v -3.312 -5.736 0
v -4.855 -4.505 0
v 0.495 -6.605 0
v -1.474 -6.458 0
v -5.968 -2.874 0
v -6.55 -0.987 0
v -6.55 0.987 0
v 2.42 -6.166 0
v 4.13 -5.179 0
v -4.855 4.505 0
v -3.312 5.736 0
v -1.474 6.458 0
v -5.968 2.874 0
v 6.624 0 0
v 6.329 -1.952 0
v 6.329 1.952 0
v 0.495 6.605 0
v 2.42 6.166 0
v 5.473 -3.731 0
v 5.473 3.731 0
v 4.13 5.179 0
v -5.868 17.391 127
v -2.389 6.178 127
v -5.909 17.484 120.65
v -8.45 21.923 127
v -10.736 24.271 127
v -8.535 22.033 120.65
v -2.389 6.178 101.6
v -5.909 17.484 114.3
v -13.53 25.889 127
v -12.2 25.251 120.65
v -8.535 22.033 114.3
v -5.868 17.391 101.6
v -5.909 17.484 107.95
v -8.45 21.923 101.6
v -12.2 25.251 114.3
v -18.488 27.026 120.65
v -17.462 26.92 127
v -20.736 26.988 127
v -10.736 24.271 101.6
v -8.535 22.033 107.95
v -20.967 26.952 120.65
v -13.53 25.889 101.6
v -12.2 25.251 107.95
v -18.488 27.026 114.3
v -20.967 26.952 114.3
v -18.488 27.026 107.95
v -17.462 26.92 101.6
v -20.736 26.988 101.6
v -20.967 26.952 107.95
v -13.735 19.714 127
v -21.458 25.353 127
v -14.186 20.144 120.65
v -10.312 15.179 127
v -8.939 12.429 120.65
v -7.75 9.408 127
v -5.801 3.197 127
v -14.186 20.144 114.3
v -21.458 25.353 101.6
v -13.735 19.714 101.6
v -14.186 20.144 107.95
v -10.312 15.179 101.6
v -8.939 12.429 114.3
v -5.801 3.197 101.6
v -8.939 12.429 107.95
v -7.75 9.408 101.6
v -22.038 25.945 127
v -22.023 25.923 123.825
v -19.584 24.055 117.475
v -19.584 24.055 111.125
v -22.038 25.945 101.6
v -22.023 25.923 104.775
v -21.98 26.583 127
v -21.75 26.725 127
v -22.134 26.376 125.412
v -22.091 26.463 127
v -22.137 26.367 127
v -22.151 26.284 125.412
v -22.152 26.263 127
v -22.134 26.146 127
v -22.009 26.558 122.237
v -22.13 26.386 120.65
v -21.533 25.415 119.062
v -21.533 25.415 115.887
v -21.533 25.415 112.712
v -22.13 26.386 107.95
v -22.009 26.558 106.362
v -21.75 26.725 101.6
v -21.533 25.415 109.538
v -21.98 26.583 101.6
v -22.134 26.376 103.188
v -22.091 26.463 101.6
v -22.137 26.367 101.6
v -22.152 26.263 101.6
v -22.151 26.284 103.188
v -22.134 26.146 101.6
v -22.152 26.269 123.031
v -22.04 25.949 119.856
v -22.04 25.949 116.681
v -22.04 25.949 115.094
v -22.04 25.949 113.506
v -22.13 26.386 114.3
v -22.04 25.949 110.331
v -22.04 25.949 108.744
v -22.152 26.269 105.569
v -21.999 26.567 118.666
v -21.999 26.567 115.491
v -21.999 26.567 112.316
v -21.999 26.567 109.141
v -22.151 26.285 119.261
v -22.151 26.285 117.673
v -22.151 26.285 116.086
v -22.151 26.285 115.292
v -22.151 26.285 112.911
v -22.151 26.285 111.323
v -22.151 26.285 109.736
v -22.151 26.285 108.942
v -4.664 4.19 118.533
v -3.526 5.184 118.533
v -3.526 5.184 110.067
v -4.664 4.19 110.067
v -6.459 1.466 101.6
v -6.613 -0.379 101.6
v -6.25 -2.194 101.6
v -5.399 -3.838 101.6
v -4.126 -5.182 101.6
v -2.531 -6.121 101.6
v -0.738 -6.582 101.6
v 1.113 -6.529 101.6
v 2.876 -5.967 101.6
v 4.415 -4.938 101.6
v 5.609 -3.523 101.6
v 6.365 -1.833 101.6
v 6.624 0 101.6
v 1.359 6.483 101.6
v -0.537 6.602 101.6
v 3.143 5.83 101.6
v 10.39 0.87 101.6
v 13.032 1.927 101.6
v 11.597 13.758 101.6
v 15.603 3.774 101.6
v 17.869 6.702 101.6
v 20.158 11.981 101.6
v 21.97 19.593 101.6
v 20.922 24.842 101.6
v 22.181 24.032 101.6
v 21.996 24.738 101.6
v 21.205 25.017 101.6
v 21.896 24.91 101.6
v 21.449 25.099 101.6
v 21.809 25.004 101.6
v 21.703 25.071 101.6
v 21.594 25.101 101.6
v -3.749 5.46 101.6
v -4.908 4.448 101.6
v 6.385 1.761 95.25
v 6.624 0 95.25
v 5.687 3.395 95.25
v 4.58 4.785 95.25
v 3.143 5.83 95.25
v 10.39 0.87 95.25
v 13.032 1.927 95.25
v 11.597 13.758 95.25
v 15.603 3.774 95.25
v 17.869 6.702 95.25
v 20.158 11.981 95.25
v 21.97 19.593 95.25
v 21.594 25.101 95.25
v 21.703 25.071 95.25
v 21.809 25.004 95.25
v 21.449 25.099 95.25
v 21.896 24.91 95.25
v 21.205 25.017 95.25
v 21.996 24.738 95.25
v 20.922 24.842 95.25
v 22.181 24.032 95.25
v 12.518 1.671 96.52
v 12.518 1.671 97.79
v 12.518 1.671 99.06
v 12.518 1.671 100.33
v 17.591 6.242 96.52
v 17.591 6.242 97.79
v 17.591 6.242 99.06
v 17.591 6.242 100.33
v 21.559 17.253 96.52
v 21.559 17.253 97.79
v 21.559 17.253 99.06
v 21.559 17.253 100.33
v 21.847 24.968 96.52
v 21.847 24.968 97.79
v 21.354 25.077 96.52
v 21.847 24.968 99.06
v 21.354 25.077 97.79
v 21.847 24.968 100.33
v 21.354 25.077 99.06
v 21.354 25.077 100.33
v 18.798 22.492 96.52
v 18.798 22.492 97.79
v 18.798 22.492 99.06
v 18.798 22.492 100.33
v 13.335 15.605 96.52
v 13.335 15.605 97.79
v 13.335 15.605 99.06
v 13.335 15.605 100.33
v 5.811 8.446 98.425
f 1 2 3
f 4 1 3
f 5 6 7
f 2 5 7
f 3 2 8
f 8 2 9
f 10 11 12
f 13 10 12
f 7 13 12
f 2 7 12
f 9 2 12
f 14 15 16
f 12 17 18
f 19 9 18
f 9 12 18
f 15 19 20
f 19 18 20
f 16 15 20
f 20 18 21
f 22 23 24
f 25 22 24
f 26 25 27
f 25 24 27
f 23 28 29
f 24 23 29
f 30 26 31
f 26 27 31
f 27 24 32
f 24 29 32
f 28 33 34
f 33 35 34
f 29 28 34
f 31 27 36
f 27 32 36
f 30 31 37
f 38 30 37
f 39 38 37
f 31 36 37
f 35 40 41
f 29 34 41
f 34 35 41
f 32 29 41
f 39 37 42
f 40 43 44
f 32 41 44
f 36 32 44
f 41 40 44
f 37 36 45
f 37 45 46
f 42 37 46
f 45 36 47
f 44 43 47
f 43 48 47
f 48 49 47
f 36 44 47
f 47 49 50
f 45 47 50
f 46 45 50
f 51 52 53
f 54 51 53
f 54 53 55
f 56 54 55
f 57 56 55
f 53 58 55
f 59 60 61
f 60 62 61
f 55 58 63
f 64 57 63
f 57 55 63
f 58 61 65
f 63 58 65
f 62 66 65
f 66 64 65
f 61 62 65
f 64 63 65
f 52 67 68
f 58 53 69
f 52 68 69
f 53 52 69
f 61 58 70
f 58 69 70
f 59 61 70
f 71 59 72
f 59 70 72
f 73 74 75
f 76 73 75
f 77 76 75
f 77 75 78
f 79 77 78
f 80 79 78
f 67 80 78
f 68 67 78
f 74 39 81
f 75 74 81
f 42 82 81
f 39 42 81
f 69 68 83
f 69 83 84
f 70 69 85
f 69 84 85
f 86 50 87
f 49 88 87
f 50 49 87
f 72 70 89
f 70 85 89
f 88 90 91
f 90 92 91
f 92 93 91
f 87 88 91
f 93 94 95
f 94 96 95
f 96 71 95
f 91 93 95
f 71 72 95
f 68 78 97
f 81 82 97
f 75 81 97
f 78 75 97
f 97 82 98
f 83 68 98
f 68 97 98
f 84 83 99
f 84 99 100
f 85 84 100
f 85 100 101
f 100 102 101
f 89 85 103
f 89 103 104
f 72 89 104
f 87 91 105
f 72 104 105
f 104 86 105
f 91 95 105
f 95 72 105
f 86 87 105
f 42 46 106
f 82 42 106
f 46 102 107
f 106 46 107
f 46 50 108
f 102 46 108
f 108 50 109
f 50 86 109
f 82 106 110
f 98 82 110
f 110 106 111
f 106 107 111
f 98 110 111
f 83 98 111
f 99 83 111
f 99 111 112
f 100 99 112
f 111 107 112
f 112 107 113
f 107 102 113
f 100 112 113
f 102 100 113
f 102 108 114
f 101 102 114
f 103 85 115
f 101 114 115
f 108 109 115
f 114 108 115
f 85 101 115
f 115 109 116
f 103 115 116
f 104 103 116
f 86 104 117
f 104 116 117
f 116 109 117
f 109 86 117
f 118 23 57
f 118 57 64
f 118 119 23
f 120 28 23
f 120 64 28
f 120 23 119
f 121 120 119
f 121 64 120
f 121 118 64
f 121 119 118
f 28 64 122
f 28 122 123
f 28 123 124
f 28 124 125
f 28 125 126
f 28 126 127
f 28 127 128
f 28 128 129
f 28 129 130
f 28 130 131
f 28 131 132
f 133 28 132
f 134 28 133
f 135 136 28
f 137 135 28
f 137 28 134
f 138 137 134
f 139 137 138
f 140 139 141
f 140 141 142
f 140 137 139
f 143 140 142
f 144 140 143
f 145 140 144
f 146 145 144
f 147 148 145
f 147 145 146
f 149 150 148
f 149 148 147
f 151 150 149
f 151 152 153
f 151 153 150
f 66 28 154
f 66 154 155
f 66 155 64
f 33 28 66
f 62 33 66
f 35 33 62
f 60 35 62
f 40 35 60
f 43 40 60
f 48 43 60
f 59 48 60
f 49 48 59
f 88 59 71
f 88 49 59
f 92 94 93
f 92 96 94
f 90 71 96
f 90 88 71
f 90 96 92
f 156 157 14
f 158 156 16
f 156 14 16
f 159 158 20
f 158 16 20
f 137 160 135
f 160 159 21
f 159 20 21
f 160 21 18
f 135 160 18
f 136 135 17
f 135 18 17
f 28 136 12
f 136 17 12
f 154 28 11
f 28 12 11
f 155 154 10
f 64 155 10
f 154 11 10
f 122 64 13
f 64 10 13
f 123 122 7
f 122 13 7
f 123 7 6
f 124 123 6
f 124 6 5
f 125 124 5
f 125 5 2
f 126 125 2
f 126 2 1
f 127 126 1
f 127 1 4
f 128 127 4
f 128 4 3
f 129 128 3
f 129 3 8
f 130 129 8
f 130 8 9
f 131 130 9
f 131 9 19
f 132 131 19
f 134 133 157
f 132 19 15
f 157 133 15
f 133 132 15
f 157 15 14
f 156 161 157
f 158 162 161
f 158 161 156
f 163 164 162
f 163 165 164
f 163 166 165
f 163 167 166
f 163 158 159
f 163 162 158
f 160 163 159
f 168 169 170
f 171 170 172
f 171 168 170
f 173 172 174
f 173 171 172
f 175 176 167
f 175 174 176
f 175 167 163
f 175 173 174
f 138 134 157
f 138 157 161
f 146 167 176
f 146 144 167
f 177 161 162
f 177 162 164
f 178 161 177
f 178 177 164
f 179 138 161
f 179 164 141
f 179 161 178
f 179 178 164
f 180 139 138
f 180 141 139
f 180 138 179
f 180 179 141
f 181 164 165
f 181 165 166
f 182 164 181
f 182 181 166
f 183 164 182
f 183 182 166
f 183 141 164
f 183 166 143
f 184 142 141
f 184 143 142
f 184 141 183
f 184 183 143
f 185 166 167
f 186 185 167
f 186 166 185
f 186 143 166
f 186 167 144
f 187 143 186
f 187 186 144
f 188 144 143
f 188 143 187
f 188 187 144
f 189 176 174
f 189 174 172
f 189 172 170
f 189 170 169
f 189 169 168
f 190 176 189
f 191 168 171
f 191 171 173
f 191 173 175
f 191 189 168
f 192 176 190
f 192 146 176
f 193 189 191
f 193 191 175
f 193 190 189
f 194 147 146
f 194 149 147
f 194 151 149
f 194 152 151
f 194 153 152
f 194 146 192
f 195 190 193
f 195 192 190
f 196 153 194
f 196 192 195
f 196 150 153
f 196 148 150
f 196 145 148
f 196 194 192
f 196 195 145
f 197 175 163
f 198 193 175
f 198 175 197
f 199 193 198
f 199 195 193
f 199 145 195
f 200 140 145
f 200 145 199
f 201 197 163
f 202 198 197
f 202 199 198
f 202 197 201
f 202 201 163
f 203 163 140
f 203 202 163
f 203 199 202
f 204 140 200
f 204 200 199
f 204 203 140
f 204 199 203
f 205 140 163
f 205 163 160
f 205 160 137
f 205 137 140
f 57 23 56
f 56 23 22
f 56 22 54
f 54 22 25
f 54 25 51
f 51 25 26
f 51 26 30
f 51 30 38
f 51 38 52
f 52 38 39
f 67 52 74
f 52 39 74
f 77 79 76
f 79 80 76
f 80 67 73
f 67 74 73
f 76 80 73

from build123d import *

# Parameters (mm, degrees)
F0_R     = 6.6235911541
F1_DEPTH = 101.6
F3_DEPTH = 6.35
F5_DEPTH = 25.4


with BuildPart() as f1:
    # F0 (on Top) → F1 (new body)
    with BuildSketch(Plane.XY):
        Circle(F0_R)
    extrude(amount=F1_DEPTH)

    # F2 (on face) → F3 (join)
    with BuildSketch(Plane.XY.offset(101.6)):
        with BuildLine():
            add(Edge.make_bspline(
                [(6.6235911541, 0), (5.551680706, 1.8932174639), (4.479770258, 3.7864349279), (3.4078598099, 5.6796523918)],
                knots=[0, 0, 0, 0, 6.5268200044, 6.5268200044, 6.5268200044, 6.5268200044], degree=3))
            add(Edge.make_bspline(
                [(6.6235911541, 0), (10.6438451154, 0.791578321), (19.6252509449, 2.5614891614), (24.720472144, 33.055623675), (14.2402206799, 14.3946295862), (2.2576603735, 5.8922725708), (3.2810318143, 5.7102540128), (3.4078598099, 5.6796523918)],
                knots=[0, 0, 0, 0, 0.2248148306, 0.5021455592, 0.7272668847, 0.9650867645, 1, 1, 1, 1], degree=3))
        make_face()
    extrude(amount=-F3_DEPTH)

    # F4 (on face) → F5 (join)
    with BuildSketch(Plane.XY.offset(101.6)):
        with BuildLine():
            add(Edge.make_bspline(
                [(-2.3887054213, 6.1778674465), (-3.5262124604, 5.1840844593), (-4.6637194994, 4.1903014722), (-5.8012265385, 3.196518485)],
                knots=[0, 0, 0, 0, 4.5314172183, 4.5314172183, 4.5314172183, 4.5314172183], degree=3))
            add(Edge.make_bspline(
                [(-2.3887054213, 6.1778674465), (-4.426021623, 14.1012351506), (-7.8619234541, 27.4696107491), (-27.4083253283, 27.3979748293), (-10.8731149842, 20.4682153567), (-7.6584856542, 9.5188311305), (-5.8012265385, 3.196518485)],
                knots=[0, 0, 0, 0, 0.3023102368, 0.5086767242, 0.7161566123, 1, 1, 1, 1], degree=3))
        make_face()
    extrude(amount=F5_DEPTH)


solid = f1.part
